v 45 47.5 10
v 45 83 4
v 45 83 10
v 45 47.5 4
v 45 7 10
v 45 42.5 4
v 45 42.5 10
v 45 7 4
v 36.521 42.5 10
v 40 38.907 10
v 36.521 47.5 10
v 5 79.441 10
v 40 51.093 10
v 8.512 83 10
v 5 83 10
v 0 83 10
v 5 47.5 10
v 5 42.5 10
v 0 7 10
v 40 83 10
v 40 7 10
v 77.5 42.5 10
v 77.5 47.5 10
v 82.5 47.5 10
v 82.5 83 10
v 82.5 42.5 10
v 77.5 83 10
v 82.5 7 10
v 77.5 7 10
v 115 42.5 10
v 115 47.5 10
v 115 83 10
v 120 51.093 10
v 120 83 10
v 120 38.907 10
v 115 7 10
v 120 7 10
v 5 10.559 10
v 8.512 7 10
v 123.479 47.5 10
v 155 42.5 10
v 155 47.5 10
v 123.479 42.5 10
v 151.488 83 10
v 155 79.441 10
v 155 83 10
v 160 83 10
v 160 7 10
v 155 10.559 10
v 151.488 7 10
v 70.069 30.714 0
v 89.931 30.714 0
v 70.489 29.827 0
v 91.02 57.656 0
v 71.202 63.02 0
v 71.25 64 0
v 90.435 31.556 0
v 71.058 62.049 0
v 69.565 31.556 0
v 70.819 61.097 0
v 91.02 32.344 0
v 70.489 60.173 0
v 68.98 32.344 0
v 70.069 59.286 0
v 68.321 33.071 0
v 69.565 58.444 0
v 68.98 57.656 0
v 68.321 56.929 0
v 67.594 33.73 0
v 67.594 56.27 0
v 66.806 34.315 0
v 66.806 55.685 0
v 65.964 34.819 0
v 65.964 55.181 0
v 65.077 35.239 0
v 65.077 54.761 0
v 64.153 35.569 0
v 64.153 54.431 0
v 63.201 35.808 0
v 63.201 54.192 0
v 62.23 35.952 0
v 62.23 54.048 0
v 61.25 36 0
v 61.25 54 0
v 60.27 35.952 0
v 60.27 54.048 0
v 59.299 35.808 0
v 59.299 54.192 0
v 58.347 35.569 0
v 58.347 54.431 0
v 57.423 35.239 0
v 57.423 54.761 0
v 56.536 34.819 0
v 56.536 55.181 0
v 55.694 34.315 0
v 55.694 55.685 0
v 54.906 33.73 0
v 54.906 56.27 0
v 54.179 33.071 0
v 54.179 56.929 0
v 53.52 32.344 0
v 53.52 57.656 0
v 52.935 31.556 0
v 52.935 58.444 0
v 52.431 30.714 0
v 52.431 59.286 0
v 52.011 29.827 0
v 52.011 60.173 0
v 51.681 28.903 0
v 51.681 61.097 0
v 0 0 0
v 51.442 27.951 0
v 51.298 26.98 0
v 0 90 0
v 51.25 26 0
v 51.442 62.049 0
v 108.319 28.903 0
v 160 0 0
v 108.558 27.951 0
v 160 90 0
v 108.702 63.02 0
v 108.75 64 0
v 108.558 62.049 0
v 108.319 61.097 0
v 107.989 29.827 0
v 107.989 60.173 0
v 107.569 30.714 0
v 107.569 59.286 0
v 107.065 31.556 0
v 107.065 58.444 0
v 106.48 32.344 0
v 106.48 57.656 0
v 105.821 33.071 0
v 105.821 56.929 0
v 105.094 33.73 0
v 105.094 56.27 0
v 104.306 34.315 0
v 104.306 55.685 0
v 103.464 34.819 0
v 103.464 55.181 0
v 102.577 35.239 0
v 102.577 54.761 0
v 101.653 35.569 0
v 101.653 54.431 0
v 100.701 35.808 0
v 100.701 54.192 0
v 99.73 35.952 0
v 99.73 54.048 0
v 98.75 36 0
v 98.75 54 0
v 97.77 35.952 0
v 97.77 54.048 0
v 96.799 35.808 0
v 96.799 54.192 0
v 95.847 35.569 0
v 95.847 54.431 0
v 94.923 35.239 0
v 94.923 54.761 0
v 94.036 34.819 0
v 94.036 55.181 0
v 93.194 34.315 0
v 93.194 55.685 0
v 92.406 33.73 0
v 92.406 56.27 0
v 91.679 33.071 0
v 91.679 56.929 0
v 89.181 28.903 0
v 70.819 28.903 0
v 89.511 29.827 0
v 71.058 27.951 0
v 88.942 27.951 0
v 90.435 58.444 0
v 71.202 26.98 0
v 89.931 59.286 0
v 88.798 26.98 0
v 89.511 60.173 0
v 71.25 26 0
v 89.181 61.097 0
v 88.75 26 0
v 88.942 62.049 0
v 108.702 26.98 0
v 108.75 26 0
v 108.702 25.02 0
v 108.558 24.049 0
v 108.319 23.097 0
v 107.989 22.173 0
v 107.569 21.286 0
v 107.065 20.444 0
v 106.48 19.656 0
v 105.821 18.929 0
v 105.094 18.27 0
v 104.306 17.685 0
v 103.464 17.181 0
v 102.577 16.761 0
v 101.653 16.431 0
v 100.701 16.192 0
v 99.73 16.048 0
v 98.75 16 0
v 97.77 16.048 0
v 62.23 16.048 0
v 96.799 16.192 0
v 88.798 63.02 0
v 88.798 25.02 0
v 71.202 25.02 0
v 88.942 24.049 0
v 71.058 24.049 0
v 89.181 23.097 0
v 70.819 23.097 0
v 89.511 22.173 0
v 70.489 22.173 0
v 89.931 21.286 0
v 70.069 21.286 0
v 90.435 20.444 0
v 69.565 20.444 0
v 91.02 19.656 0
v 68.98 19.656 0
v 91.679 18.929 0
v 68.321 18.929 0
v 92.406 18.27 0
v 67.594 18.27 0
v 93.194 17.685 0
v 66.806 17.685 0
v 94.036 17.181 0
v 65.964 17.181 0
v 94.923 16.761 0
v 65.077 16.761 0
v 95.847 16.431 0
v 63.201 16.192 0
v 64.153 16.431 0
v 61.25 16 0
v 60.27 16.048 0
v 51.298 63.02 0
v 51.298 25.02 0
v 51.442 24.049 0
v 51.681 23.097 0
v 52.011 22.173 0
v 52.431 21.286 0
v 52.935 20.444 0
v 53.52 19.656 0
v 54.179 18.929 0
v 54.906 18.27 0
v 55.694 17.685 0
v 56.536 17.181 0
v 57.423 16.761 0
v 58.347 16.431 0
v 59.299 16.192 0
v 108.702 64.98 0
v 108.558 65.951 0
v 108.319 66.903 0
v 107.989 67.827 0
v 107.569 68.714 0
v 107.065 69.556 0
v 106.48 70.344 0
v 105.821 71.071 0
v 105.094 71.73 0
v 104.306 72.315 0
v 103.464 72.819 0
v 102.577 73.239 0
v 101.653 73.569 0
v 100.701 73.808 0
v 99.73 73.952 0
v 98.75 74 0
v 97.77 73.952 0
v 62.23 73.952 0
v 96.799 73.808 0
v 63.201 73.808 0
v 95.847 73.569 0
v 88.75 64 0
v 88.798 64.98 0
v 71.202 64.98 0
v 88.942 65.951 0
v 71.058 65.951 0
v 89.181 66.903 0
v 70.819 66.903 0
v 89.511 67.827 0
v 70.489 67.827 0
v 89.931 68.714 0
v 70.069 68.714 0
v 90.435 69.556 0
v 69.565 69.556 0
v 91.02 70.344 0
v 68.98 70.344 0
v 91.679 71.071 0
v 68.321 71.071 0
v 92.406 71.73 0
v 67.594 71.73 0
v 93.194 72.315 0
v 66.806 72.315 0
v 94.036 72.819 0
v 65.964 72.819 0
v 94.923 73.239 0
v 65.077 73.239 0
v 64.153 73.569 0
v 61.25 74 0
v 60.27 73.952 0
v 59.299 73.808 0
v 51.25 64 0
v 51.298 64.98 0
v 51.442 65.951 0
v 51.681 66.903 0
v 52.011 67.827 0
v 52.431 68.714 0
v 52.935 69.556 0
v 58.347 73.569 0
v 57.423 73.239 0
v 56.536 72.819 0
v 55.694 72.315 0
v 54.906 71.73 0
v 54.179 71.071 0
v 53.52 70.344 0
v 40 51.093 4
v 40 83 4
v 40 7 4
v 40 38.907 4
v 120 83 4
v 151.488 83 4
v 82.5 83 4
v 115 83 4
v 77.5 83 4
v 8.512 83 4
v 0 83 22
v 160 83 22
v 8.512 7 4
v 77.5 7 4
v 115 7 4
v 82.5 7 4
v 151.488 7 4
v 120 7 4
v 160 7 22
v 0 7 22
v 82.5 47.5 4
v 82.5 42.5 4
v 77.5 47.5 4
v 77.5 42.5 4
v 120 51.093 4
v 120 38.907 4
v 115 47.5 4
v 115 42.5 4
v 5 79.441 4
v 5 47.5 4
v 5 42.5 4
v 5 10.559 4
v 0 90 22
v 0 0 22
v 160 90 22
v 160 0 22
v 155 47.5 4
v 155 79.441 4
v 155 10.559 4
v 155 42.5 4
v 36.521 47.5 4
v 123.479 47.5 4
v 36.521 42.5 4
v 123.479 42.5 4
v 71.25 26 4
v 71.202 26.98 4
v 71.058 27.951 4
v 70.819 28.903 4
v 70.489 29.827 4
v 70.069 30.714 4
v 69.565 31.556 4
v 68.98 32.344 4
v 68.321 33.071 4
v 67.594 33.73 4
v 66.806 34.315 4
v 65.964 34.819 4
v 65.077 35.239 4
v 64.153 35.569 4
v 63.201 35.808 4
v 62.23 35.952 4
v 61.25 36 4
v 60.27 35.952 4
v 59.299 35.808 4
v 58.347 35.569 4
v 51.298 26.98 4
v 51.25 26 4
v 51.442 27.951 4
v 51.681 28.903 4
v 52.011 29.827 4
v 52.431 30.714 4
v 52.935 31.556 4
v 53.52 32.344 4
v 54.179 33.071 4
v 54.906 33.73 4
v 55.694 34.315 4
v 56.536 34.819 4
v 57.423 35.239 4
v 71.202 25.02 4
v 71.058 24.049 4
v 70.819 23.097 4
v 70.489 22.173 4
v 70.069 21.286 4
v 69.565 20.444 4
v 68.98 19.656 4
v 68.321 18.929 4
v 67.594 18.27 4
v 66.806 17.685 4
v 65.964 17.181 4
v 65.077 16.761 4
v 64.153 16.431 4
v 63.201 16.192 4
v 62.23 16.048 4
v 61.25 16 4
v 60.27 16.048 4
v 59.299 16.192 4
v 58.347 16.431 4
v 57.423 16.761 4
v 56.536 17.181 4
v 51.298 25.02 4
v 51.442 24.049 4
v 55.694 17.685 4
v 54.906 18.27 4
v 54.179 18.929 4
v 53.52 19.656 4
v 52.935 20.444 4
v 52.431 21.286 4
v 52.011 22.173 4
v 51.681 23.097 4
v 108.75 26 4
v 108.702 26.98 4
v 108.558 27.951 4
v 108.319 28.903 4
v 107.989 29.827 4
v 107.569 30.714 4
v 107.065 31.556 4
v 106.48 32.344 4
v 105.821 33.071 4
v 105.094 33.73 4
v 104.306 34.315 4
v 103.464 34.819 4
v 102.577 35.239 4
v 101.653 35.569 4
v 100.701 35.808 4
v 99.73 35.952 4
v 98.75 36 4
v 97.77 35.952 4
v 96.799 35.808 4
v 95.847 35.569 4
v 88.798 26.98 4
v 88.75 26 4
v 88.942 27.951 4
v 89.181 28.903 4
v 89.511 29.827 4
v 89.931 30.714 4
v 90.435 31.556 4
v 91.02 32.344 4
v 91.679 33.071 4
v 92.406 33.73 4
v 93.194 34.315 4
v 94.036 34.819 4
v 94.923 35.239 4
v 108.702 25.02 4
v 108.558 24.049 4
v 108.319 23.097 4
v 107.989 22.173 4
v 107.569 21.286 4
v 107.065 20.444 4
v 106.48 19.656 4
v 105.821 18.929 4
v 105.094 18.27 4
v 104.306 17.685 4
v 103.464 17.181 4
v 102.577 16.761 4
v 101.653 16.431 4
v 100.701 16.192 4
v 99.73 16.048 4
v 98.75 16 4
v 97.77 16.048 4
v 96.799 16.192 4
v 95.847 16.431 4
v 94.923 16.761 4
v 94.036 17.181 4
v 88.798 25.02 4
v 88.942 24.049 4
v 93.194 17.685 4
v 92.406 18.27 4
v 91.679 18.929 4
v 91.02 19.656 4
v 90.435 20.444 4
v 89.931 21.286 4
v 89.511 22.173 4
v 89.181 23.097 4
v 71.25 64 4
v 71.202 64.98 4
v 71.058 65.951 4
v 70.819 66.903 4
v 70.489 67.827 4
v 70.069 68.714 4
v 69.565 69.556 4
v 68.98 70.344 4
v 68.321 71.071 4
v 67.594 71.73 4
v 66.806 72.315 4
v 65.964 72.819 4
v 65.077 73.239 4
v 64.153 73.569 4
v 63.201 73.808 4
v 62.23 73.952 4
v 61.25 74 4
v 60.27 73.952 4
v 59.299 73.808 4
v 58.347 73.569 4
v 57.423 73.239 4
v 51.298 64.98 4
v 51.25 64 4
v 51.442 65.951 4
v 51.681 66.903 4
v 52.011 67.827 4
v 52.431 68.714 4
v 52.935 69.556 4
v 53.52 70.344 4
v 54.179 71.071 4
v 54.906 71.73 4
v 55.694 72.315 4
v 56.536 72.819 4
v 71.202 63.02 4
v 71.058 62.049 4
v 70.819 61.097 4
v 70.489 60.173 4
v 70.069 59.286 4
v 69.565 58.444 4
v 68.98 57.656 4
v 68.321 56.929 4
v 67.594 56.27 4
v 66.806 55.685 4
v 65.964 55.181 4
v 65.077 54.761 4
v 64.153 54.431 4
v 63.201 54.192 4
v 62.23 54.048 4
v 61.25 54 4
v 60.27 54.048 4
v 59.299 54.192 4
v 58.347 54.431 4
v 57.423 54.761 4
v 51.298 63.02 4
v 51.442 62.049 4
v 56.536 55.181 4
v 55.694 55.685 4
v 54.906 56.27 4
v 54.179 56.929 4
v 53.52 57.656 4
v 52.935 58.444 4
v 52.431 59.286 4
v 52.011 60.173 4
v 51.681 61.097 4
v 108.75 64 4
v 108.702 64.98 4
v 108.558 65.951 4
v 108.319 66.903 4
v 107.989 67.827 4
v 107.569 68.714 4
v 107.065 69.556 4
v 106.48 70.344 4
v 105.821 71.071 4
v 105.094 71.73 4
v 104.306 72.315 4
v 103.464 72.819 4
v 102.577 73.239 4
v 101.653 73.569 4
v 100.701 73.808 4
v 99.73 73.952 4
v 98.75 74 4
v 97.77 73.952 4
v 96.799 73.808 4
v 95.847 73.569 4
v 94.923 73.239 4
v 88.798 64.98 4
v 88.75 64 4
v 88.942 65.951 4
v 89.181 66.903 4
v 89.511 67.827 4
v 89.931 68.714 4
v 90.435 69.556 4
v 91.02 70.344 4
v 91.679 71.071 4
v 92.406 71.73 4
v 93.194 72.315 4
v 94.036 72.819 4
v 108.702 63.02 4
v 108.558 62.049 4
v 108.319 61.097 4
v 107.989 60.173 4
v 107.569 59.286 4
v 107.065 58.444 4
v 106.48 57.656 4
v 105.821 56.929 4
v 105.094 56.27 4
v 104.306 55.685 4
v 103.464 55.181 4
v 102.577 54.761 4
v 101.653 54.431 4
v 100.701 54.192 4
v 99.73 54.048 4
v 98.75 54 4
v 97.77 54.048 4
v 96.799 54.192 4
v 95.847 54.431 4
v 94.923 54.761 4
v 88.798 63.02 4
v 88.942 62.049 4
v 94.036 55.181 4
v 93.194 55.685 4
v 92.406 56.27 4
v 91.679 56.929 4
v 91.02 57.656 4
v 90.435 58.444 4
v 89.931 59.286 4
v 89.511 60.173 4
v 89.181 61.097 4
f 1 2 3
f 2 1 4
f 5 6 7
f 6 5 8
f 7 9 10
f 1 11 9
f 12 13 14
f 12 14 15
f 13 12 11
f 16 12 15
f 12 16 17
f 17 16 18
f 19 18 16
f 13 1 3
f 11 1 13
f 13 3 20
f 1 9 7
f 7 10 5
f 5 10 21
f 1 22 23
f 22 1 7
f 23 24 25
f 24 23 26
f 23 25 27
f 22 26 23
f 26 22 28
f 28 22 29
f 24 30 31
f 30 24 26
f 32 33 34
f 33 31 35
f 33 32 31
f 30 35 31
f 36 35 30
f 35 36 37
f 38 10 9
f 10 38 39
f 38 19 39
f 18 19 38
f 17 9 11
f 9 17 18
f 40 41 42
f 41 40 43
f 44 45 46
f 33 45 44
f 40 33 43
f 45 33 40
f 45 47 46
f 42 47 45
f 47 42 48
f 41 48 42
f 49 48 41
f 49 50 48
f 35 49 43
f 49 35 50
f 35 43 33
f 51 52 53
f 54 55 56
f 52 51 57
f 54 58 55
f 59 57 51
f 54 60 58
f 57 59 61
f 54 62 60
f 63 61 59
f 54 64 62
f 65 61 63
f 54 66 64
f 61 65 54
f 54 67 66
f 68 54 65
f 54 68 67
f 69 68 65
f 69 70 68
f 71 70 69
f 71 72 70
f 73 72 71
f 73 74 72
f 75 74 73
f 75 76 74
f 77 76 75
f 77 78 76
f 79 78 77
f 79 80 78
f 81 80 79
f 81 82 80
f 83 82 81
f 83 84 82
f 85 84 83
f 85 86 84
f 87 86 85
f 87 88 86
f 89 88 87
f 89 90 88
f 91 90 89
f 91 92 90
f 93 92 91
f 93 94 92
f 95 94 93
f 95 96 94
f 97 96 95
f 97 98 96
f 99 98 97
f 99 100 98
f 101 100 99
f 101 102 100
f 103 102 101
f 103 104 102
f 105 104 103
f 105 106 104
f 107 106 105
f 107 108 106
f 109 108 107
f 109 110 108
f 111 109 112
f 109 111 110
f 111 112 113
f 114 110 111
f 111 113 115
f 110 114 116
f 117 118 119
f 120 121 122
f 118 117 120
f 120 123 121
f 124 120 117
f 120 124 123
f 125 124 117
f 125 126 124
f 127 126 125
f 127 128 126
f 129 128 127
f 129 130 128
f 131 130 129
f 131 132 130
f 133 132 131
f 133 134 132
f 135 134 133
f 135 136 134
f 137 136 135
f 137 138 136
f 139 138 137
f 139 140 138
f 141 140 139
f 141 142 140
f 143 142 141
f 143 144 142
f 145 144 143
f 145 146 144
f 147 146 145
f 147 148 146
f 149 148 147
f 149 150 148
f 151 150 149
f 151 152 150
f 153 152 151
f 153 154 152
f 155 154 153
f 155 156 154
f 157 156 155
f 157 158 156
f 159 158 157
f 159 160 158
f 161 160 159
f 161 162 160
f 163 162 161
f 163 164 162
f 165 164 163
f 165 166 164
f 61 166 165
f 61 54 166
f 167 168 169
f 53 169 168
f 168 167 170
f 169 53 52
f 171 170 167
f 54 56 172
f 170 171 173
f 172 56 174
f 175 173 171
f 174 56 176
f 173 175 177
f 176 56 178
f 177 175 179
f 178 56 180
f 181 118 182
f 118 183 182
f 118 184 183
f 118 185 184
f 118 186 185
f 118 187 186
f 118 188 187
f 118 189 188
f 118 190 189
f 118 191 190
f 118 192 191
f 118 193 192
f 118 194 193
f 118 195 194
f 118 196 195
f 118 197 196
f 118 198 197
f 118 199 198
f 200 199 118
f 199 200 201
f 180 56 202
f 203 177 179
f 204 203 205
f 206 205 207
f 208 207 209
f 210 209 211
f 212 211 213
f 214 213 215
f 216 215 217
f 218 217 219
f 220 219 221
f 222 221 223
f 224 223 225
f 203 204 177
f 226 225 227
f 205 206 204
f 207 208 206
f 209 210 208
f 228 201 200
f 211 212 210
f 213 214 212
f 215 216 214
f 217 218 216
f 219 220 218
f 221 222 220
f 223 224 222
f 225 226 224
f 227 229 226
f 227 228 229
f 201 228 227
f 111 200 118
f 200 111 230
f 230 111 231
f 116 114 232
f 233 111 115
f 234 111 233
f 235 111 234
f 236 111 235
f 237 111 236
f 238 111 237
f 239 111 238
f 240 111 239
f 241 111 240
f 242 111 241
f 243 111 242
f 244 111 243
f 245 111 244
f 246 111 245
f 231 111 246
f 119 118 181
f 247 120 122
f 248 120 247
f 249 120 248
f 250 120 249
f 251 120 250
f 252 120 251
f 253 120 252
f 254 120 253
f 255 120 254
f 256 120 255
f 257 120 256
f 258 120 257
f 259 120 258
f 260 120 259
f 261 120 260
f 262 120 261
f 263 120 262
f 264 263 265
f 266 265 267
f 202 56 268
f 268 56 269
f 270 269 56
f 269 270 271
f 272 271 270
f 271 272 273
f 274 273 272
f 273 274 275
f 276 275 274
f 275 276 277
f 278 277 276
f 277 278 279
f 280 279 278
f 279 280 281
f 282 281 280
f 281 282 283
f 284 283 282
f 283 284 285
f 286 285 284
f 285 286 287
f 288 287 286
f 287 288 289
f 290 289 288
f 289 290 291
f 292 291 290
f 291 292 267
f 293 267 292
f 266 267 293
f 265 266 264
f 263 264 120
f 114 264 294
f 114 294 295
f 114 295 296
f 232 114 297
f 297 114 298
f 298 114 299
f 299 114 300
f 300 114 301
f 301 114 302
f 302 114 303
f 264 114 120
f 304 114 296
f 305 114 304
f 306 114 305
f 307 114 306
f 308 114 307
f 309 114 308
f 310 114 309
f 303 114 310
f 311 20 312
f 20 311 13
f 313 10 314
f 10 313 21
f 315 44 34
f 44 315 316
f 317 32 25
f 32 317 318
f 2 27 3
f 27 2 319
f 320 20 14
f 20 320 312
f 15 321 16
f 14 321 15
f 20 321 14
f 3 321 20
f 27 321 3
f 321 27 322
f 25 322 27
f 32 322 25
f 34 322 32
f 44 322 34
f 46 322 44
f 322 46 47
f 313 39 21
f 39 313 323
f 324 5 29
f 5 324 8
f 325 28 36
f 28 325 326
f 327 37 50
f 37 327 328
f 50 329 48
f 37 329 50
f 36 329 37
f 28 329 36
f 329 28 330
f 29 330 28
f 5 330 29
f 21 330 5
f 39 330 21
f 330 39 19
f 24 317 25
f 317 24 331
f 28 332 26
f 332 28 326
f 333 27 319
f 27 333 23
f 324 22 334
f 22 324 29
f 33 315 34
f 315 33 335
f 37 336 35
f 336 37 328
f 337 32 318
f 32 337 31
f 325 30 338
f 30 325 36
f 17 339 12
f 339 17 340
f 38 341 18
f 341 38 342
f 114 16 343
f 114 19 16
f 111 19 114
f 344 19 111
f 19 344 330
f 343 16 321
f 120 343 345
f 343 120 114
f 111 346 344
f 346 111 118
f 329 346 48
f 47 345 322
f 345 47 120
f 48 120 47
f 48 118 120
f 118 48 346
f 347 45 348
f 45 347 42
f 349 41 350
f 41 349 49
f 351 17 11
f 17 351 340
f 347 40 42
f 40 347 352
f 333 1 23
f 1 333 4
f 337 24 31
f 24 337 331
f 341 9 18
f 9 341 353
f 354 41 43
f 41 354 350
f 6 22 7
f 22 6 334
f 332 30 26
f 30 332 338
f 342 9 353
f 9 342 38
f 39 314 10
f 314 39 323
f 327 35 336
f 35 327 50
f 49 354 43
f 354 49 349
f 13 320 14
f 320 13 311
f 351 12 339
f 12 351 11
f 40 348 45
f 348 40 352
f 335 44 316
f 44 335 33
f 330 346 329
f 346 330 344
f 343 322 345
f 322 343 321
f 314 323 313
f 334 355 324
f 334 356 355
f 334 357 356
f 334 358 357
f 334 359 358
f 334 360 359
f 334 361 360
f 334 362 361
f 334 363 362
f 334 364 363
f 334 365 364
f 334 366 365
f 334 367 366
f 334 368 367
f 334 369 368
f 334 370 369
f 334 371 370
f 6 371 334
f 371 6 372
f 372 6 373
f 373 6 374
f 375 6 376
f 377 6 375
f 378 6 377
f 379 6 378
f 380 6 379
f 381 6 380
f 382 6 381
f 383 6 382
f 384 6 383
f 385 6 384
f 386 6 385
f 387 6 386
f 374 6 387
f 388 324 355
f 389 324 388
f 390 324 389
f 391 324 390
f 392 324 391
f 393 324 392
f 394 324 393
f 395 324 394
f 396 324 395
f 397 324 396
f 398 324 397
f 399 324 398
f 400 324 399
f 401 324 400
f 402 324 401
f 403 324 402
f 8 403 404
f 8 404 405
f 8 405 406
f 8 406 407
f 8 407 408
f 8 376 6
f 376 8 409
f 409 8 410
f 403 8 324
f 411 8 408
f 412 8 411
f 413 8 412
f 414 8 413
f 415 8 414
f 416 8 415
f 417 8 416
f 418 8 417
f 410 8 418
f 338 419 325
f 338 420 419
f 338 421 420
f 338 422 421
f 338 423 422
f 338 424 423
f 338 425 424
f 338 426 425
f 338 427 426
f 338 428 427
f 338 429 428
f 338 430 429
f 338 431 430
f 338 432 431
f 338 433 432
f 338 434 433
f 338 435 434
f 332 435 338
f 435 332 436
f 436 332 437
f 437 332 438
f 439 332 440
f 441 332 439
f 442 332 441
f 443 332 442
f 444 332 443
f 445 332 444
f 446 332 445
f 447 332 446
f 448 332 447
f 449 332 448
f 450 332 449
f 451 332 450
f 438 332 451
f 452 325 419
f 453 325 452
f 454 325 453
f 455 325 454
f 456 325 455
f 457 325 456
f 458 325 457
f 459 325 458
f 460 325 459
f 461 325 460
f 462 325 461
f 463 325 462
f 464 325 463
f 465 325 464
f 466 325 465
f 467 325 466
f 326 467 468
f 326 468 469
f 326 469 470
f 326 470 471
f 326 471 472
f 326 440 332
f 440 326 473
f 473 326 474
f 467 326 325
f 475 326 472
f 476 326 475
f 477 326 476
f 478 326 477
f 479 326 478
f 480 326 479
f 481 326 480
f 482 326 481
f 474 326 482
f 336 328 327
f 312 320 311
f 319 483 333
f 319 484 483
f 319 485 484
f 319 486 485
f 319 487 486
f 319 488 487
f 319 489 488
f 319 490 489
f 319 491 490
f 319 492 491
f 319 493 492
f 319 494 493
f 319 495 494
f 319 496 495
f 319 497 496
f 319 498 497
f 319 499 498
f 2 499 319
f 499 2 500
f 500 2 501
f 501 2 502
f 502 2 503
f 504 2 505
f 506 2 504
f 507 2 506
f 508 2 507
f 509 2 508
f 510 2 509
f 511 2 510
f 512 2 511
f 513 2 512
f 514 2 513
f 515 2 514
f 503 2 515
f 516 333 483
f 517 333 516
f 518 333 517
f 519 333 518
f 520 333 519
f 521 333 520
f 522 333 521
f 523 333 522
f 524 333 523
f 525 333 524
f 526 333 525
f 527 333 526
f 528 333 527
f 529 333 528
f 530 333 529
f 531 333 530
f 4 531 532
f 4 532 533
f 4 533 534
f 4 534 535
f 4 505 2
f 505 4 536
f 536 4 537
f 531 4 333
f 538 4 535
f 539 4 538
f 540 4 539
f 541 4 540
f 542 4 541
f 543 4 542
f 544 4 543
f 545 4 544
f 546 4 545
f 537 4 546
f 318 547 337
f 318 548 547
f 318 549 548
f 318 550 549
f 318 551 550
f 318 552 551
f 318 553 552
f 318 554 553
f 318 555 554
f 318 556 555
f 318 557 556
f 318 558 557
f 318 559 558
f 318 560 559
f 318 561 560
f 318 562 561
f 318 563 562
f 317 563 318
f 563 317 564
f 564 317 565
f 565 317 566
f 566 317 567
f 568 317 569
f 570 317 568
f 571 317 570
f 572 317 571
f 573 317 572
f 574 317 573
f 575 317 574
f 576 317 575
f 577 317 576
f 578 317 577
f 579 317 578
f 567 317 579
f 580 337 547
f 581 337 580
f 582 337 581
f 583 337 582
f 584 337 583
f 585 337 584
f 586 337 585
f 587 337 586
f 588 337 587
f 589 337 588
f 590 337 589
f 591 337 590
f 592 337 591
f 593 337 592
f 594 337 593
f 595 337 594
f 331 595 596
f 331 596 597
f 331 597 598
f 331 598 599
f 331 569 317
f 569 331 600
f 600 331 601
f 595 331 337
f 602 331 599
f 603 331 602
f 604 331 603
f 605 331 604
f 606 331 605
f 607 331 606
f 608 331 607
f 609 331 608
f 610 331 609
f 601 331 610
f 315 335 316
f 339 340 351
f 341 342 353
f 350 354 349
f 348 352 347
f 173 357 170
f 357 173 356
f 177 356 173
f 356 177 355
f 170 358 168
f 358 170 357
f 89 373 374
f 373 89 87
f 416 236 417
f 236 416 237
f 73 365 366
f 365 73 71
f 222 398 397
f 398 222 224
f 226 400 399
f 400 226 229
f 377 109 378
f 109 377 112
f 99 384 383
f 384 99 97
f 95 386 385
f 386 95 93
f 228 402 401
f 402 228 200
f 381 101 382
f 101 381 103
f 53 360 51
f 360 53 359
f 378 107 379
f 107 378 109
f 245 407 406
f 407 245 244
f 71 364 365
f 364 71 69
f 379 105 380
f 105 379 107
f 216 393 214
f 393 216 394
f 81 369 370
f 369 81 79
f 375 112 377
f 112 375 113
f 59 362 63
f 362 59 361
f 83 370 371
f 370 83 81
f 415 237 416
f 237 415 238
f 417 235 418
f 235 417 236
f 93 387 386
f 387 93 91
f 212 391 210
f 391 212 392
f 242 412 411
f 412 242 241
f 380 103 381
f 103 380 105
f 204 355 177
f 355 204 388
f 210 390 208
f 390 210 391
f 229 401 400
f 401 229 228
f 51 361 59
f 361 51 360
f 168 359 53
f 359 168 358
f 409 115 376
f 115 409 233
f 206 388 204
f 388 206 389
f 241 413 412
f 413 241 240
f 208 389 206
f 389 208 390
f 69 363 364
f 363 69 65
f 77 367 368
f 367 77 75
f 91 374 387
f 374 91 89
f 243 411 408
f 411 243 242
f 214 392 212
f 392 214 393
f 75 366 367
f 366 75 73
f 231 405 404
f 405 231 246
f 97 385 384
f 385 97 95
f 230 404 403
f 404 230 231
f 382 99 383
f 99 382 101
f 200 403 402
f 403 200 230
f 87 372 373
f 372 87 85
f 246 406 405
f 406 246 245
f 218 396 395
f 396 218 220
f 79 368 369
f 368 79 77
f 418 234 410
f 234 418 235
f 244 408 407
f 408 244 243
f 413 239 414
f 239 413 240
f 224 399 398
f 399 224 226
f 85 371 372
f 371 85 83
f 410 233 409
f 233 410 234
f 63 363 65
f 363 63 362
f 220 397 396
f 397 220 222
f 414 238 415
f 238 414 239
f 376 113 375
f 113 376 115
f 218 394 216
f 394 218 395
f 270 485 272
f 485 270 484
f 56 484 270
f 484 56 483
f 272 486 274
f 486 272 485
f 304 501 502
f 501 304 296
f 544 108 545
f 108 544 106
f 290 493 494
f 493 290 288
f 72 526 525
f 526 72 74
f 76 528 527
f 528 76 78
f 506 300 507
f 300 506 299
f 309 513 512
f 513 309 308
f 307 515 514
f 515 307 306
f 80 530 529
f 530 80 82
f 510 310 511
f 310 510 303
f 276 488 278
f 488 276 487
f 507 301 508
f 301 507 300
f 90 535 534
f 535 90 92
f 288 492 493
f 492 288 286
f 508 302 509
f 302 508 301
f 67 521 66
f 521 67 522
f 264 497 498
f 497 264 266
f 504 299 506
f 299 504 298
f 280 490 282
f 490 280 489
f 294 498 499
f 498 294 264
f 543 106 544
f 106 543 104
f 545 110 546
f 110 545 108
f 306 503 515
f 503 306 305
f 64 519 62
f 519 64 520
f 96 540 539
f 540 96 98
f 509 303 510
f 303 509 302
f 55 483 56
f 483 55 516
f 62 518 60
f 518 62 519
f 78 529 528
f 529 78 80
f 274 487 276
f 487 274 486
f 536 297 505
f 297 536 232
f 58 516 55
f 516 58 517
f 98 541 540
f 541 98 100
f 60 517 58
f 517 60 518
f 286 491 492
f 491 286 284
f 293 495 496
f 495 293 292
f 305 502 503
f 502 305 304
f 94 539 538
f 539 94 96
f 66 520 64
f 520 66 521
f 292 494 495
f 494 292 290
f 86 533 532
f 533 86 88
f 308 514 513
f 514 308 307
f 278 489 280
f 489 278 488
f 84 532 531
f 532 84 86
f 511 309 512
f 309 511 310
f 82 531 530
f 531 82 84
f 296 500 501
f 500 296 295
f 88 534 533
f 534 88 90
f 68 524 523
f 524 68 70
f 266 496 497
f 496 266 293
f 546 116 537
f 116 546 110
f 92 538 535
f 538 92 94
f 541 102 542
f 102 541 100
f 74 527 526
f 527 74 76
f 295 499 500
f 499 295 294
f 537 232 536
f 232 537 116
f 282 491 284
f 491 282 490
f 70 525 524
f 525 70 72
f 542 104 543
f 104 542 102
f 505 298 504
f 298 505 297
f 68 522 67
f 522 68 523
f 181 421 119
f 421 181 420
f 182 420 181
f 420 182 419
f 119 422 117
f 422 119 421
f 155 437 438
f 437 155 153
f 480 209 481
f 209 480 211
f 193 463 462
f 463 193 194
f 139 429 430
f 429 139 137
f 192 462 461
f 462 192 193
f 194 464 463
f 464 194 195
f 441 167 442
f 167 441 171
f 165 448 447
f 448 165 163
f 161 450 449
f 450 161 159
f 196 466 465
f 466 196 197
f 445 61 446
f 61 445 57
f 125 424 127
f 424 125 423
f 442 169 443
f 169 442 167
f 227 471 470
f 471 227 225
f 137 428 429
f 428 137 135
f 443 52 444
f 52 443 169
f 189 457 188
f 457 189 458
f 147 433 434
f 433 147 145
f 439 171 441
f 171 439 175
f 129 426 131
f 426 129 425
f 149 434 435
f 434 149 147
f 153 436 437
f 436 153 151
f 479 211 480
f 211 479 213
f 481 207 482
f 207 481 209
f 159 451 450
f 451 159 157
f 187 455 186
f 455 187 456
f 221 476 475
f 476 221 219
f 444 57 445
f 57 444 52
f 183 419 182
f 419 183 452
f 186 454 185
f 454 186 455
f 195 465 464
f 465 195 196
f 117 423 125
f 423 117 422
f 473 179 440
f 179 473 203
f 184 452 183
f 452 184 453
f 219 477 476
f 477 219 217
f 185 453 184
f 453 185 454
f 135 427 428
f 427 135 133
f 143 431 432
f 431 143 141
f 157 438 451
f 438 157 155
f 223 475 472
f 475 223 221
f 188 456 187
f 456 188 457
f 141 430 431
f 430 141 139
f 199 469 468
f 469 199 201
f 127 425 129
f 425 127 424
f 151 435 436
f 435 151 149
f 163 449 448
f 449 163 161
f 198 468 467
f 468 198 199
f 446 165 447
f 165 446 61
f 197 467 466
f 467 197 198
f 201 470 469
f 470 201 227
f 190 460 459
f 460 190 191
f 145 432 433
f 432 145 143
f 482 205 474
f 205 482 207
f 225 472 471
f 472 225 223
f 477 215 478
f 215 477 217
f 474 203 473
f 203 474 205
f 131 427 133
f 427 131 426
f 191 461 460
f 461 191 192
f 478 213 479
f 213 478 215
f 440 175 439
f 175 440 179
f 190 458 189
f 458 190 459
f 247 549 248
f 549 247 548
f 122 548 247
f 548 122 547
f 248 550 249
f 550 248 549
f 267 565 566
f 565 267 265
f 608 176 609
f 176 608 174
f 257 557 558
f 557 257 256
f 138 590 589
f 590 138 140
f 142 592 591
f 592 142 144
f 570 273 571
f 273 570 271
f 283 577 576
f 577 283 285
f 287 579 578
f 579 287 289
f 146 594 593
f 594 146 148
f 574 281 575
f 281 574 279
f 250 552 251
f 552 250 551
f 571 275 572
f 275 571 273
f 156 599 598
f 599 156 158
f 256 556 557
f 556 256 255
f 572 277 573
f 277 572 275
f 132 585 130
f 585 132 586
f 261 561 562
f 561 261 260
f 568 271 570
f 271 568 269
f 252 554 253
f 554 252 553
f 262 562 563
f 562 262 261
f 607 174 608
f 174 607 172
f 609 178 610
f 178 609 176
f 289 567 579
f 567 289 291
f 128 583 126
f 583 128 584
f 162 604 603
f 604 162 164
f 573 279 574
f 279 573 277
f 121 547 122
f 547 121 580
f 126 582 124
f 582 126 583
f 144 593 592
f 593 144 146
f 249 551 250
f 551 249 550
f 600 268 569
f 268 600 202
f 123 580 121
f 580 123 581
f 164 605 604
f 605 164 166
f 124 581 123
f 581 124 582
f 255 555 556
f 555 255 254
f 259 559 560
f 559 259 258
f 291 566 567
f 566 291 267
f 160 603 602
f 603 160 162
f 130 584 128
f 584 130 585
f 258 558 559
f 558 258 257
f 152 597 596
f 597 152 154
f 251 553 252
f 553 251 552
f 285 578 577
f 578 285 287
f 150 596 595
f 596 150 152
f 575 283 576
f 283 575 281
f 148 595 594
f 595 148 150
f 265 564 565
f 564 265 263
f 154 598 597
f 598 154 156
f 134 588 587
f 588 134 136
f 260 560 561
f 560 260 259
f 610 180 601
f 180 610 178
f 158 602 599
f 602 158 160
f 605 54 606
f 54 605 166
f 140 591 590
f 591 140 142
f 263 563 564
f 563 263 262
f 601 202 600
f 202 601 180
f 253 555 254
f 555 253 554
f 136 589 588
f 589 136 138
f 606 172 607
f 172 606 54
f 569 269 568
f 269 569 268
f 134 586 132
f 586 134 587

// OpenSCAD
// ============================================================
//  Open-web ribbed panel with raised side walls
//  - thin shallow web (floor) with a grid of cross ribs,
//    corner diagonal ribs and circular through openings
//  - two long solid side walls raised above the web
// ============================================================

// ---------------- Parameters ----------------
L       = 160;   // overall length (X)
W       = 90;    // overall width  (Y)
web_t   = 4;     // thickness of the shallow web / floor
rib_w   = 5;     // width of every rib
rib_h   = 10;    // rib height, measured from the base plane
wall_t  = 7;     // side-wall thickness
wall_h  = 22;    // side-wall height, measured from the base plane
cols    = 4;     // number of web cells along X
rows    = 2;     // number of web cells along Y
hole_d  = 20;    // diameter of the circular openings through the web
$fn     = 64;

// ---------------- Derived values ----------------
x0    = rib_w;              // start of the open interior along X
y0    = wall_t;             // start of the open interior along Y
Li    = L - 2*rib_w;        // interior length
Wi    = W - 2*wall_t;       // interior width
cellW = Li / cols;          // cell size along X
cellH = Wi / rows;          // cell size along Y

// ---------------- Modules ----------------

// Shallow web (floor) that closes the base side
module web() {
    cube([L, W, web_t]);
}

// Straight rib between two points in the XY plane
module diag_rib(ax, ay, bx, by, w, h) {
    dx = bx - ax;
    dy = by - ay;
    translate([ax, ay, 0])
        rotate([0, 0, atan2(dy, dx)])
            translate([0, -w/2, 0])
                cube([norm([dx, dy]), w, h]);
}

// Rib network: end ribs, cross ribs and corner diagonals
module ribs() {
    // short-edge (end) ribs
    cube([rib_w, W, rib_h]);
    translate([L - rib_w, 0, 0]) cube([rib_w, W, rib_h]);

    // longitudinal cross ribs
    for (i = [1 : cols - 1])
        translate([x0 + i*cellW - rib_w/2, y0, 0])
            cube([rib_w, Wi, rib_h]);

    // transverse cross rib through the middle
    translate([x0, W/2 - rib_w/2, 0]) cube([Li, rib_w, rib_h]);

    // diagonal ribs in the four corner cells
    diag_rib(x0,      y0,      x0 + cellW,      y0 + cellH,      rib_w, rib_h);
    diag_rib(x0 + Li, y0,      x0 + Li - cellW, y0 + cellH,      rib_w, rib_h);
    diag_rib(x0,      y0 + Wi, x0 + cellW,      y0 + Wi - cellH, rib_w, rib_h);
    diag_rib(x0 + Li, y0 + Wi, x0 + Li - cellW, y0 + Wi - cellH, rib_w, rib_h);
}

// Two long side walls added along opposite edges (solid, higher than web)
module side_walls() {
    cube([L, wall_t, wall_h]);
    translate([0, W - wall_t, 0]) cube([L, wall_t, wall_h]);
}

// Circular openings cut through the web in the open cells
module openings() {
    for (c = [1 : cols - 2], r = [0 : rows - 1])
        translate([x0 + (c + 0.5)*cellW, y0 + (r + 0.5)*cellH, -1])
            cylinder(h = web_t + 2, d = hole_d);
}

// ---------------- Assembly ----------------
difference() {
    union() {
        web();          // thin base web
        ribs();         // perimeter + cross + diagonal ribs
        side_walls();   // raised long side walls
    }
    openings();         // voids: open cells stay empty, holes go through the base
}
